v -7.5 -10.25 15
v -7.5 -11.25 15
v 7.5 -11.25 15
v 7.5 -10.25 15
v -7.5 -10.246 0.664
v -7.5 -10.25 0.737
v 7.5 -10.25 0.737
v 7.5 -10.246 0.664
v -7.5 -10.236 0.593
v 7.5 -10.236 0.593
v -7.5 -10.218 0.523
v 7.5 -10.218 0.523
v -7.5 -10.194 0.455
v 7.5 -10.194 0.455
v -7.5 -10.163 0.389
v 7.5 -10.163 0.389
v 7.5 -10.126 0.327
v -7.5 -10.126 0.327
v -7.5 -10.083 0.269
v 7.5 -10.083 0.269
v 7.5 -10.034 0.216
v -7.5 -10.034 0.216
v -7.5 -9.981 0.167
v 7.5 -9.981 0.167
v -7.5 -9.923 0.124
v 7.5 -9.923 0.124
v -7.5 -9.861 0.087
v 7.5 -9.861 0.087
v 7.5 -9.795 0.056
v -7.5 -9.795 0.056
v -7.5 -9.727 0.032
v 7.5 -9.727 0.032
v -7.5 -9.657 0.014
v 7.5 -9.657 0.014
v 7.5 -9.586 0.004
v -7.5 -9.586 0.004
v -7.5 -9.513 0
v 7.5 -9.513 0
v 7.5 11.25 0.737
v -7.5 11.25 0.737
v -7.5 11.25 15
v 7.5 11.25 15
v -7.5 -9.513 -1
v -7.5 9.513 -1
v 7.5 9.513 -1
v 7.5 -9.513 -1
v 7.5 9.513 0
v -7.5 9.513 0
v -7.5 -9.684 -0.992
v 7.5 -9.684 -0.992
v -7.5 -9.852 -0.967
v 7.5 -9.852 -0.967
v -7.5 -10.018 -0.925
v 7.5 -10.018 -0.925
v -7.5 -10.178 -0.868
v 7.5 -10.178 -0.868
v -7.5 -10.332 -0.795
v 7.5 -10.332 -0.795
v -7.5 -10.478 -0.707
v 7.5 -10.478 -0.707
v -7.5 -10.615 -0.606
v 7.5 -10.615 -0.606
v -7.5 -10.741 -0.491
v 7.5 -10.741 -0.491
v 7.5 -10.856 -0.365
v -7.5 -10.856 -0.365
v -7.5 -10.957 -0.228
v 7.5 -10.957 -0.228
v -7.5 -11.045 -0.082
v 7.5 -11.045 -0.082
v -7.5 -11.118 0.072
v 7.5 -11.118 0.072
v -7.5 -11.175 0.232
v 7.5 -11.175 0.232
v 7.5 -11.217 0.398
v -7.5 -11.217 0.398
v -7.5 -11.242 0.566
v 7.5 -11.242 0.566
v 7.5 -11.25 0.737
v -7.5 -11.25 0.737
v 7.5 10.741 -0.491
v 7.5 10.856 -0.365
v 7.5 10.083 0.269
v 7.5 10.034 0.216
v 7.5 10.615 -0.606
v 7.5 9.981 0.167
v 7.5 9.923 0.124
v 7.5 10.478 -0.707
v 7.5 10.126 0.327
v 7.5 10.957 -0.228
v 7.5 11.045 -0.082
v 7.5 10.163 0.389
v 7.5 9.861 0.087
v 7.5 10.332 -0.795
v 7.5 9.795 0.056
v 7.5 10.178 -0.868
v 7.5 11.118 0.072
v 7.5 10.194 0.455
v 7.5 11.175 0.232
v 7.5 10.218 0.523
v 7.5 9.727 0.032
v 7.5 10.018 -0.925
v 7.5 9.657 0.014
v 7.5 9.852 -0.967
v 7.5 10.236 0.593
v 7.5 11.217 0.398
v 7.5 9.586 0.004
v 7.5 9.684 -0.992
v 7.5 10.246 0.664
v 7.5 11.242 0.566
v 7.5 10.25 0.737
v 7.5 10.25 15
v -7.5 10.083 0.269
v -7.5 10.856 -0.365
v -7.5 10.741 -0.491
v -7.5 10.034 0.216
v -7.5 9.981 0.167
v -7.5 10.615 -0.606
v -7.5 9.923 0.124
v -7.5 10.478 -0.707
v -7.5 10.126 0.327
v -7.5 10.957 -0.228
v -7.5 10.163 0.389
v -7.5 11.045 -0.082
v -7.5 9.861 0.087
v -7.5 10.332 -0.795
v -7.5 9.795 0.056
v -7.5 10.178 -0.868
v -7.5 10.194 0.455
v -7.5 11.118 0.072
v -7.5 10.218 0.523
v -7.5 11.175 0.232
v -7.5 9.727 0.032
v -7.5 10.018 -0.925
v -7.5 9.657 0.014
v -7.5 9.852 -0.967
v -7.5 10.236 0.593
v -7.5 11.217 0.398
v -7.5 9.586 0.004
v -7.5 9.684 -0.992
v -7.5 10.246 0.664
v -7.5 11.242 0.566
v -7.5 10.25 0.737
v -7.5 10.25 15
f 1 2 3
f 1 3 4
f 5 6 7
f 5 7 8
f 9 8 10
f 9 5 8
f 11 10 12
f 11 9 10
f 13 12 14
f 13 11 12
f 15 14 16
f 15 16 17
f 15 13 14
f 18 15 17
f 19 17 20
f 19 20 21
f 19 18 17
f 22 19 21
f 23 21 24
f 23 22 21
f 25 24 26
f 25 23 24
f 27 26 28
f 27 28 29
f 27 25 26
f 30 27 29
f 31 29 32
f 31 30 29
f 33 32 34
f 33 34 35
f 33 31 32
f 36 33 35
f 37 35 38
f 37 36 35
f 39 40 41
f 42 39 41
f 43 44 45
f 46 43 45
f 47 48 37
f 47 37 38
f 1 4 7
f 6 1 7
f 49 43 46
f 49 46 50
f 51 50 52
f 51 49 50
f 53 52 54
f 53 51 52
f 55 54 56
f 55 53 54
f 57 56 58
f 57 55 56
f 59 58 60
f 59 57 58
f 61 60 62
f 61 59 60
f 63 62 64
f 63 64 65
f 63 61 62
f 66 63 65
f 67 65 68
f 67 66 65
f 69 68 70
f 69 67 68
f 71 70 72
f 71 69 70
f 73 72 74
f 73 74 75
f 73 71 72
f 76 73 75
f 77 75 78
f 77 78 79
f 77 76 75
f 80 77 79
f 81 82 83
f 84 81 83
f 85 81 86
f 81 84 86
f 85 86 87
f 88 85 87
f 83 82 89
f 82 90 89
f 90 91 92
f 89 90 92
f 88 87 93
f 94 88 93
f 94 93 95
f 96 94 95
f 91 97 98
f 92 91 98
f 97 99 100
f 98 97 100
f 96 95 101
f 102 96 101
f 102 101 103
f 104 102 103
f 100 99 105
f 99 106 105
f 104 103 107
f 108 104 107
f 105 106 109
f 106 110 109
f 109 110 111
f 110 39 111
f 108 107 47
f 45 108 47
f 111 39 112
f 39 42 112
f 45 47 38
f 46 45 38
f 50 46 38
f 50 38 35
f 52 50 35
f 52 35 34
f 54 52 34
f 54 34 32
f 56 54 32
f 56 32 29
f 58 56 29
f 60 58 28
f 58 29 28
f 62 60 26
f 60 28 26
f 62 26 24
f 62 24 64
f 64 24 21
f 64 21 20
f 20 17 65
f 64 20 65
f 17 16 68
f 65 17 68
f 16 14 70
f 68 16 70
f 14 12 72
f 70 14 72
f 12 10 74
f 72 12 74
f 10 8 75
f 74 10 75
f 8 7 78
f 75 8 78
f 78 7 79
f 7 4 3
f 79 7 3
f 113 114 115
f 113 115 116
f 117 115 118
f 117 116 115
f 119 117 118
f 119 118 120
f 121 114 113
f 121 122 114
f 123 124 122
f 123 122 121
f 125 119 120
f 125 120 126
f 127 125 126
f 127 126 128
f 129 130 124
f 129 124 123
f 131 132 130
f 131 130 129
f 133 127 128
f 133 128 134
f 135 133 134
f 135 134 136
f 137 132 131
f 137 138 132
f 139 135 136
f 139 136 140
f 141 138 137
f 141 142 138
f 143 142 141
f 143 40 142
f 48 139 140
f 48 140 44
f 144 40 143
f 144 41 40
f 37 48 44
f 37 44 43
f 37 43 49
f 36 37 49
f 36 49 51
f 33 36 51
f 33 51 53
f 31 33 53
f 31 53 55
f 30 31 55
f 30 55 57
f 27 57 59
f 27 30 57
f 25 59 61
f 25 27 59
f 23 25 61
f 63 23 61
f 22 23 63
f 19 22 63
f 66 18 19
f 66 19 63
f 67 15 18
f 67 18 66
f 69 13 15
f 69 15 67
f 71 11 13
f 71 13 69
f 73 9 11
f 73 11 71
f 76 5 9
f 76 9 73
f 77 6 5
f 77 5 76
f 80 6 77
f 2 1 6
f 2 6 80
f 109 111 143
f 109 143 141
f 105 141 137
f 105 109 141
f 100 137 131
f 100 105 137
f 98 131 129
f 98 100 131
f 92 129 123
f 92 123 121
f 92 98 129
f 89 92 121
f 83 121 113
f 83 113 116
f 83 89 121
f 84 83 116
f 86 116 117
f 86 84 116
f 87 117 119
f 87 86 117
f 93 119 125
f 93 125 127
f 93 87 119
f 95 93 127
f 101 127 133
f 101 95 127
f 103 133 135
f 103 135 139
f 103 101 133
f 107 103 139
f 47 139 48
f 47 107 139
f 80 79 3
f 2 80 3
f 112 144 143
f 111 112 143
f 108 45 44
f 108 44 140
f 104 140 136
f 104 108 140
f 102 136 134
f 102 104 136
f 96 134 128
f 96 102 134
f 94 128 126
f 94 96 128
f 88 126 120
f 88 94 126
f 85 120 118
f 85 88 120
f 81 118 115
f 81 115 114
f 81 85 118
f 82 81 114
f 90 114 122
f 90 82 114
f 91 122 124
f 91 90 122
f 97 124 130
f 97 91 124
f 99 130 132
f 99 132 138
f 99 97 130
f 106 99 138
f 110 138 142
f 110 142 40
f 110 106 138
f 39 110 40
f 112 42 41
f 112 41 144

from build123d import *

# Parameters (mm, degrees)
SKETCH1_W                    = 15
SKETCH1_H                    = 20
BASE_FLANGE1_DEPTH           = 1
EDGE_FLANGE1_STRIP_W         = 5.7232
EDGE_FLANGE1_STRIP_H         = 1
EDGE_FLANGE1_STRIP_CUT_DEPTH = 15
EDGE_FLANGE1_DEPTH           = 15
EDGE_FLANGE2_STRIP_W         = 5.7232
EDGE_FLANGE2_STRIP_H         = 1
EDGE_FLANGE2_STRIP_CUT_DEPTH = 15
EDGE_FLANGE2_DEPTH           = 15


# Sheet-metal steps are written as plain solids
with BuildPart() as part:
    # Sketch1 → Base-Flange1 (new body)
    with BuildSketch(Plane.XY):
        Rectangle(SKETCH1_W, SKETCH1_H)
    extrude(amount=-BASE_FLANGE1_DEPTH)

    # Edge-Flange1 strip (across the edge) → Edge-Flange1 strip cut (cut)
    with BuildSketch(Plane(origin=(7.5, 10.25, 0), x_dir=(0, -1, 0), z_dir=(-1, 0, 0))):
        with Locations((-2.125, -0.5)):
            Rectangle(EDGE_FLANGE1_STRIP_W, EDGE_FLANGE1_STRIP_H)
    extrude(amount=EDGE_FLANGE1_STRIP_CUT_DEPTH, mode=Mode.SUBTRACT)

    # Edge-Flange1 section (across the edge) → Edge-Flange1 (add)
    with BuildSketch(Plane(origin=(7.5, 10.25, 0), x_dir=(0, -1, 0), z_dir=(-1, 0, 0))):
        with BuildLine():
            Line((-1, 0.7366), (-1, 15))
            Line((-1, 15), (0, 15))
            Line((0, 15), (0, 0.7366))
            ThreePointArc((0, 0.7366), (0.215745145, 0.215745145), (0.7366, 0))
            Line((0.7366, 0), (0.7366, -1))
            ThreePointArc((0.7366, -1), (-0.491361636, -0.491361636), (-1, 0.7366))
        make_face()
    extrude(amount=EDGE_FLANGE1_DEPTH)

    # Edge-Flange2 strip (across the edge) → Edge-Flange2 strip cut (cut)
    with BuildSketch(Plane(origin=(-7.5, -10.25, 0), x_dir=(0, 1, 0), z_dir=(1, 0, 0))):
        with Locations((-2.125, -0.5)):
            Rectangle(EDGE_FLANGE2_STRIP_W, EDGE_FLANGE2_STRIP_H)
    extrude(amount=EDGE_FLANGE2_STRIP_CUT_DEPTH, mode=Mode.SUBTRACT)

    # Edge-Flange2 section (across the edge) → Edge-Flange2 (add)
    with BuildSketch(Plane(origin=(-7.5, -10.25, 0), x_dir=(0, 1, 0), z_dir=(1, 0, 0))):
        with BuildLine():
            Line((-1, 0.7366), (-1, 15))
            Line((-1, 15), (0, 15))
            Line((0, 15), (0, 0.7366))
            ThreePointArc((0, 0.7366), (0.215745145, 0.215745145), (0.7366, 0))
            Line((0.7366, 0), (0.7366, -1))
            ThreePointArc((0.7366, -1), (-0.491361636, -0.491361636), (-1, 0.7366))
        make_face()
    extrude(amount=EDGE_FLANGE2_DEPTH)


solid = part.part
